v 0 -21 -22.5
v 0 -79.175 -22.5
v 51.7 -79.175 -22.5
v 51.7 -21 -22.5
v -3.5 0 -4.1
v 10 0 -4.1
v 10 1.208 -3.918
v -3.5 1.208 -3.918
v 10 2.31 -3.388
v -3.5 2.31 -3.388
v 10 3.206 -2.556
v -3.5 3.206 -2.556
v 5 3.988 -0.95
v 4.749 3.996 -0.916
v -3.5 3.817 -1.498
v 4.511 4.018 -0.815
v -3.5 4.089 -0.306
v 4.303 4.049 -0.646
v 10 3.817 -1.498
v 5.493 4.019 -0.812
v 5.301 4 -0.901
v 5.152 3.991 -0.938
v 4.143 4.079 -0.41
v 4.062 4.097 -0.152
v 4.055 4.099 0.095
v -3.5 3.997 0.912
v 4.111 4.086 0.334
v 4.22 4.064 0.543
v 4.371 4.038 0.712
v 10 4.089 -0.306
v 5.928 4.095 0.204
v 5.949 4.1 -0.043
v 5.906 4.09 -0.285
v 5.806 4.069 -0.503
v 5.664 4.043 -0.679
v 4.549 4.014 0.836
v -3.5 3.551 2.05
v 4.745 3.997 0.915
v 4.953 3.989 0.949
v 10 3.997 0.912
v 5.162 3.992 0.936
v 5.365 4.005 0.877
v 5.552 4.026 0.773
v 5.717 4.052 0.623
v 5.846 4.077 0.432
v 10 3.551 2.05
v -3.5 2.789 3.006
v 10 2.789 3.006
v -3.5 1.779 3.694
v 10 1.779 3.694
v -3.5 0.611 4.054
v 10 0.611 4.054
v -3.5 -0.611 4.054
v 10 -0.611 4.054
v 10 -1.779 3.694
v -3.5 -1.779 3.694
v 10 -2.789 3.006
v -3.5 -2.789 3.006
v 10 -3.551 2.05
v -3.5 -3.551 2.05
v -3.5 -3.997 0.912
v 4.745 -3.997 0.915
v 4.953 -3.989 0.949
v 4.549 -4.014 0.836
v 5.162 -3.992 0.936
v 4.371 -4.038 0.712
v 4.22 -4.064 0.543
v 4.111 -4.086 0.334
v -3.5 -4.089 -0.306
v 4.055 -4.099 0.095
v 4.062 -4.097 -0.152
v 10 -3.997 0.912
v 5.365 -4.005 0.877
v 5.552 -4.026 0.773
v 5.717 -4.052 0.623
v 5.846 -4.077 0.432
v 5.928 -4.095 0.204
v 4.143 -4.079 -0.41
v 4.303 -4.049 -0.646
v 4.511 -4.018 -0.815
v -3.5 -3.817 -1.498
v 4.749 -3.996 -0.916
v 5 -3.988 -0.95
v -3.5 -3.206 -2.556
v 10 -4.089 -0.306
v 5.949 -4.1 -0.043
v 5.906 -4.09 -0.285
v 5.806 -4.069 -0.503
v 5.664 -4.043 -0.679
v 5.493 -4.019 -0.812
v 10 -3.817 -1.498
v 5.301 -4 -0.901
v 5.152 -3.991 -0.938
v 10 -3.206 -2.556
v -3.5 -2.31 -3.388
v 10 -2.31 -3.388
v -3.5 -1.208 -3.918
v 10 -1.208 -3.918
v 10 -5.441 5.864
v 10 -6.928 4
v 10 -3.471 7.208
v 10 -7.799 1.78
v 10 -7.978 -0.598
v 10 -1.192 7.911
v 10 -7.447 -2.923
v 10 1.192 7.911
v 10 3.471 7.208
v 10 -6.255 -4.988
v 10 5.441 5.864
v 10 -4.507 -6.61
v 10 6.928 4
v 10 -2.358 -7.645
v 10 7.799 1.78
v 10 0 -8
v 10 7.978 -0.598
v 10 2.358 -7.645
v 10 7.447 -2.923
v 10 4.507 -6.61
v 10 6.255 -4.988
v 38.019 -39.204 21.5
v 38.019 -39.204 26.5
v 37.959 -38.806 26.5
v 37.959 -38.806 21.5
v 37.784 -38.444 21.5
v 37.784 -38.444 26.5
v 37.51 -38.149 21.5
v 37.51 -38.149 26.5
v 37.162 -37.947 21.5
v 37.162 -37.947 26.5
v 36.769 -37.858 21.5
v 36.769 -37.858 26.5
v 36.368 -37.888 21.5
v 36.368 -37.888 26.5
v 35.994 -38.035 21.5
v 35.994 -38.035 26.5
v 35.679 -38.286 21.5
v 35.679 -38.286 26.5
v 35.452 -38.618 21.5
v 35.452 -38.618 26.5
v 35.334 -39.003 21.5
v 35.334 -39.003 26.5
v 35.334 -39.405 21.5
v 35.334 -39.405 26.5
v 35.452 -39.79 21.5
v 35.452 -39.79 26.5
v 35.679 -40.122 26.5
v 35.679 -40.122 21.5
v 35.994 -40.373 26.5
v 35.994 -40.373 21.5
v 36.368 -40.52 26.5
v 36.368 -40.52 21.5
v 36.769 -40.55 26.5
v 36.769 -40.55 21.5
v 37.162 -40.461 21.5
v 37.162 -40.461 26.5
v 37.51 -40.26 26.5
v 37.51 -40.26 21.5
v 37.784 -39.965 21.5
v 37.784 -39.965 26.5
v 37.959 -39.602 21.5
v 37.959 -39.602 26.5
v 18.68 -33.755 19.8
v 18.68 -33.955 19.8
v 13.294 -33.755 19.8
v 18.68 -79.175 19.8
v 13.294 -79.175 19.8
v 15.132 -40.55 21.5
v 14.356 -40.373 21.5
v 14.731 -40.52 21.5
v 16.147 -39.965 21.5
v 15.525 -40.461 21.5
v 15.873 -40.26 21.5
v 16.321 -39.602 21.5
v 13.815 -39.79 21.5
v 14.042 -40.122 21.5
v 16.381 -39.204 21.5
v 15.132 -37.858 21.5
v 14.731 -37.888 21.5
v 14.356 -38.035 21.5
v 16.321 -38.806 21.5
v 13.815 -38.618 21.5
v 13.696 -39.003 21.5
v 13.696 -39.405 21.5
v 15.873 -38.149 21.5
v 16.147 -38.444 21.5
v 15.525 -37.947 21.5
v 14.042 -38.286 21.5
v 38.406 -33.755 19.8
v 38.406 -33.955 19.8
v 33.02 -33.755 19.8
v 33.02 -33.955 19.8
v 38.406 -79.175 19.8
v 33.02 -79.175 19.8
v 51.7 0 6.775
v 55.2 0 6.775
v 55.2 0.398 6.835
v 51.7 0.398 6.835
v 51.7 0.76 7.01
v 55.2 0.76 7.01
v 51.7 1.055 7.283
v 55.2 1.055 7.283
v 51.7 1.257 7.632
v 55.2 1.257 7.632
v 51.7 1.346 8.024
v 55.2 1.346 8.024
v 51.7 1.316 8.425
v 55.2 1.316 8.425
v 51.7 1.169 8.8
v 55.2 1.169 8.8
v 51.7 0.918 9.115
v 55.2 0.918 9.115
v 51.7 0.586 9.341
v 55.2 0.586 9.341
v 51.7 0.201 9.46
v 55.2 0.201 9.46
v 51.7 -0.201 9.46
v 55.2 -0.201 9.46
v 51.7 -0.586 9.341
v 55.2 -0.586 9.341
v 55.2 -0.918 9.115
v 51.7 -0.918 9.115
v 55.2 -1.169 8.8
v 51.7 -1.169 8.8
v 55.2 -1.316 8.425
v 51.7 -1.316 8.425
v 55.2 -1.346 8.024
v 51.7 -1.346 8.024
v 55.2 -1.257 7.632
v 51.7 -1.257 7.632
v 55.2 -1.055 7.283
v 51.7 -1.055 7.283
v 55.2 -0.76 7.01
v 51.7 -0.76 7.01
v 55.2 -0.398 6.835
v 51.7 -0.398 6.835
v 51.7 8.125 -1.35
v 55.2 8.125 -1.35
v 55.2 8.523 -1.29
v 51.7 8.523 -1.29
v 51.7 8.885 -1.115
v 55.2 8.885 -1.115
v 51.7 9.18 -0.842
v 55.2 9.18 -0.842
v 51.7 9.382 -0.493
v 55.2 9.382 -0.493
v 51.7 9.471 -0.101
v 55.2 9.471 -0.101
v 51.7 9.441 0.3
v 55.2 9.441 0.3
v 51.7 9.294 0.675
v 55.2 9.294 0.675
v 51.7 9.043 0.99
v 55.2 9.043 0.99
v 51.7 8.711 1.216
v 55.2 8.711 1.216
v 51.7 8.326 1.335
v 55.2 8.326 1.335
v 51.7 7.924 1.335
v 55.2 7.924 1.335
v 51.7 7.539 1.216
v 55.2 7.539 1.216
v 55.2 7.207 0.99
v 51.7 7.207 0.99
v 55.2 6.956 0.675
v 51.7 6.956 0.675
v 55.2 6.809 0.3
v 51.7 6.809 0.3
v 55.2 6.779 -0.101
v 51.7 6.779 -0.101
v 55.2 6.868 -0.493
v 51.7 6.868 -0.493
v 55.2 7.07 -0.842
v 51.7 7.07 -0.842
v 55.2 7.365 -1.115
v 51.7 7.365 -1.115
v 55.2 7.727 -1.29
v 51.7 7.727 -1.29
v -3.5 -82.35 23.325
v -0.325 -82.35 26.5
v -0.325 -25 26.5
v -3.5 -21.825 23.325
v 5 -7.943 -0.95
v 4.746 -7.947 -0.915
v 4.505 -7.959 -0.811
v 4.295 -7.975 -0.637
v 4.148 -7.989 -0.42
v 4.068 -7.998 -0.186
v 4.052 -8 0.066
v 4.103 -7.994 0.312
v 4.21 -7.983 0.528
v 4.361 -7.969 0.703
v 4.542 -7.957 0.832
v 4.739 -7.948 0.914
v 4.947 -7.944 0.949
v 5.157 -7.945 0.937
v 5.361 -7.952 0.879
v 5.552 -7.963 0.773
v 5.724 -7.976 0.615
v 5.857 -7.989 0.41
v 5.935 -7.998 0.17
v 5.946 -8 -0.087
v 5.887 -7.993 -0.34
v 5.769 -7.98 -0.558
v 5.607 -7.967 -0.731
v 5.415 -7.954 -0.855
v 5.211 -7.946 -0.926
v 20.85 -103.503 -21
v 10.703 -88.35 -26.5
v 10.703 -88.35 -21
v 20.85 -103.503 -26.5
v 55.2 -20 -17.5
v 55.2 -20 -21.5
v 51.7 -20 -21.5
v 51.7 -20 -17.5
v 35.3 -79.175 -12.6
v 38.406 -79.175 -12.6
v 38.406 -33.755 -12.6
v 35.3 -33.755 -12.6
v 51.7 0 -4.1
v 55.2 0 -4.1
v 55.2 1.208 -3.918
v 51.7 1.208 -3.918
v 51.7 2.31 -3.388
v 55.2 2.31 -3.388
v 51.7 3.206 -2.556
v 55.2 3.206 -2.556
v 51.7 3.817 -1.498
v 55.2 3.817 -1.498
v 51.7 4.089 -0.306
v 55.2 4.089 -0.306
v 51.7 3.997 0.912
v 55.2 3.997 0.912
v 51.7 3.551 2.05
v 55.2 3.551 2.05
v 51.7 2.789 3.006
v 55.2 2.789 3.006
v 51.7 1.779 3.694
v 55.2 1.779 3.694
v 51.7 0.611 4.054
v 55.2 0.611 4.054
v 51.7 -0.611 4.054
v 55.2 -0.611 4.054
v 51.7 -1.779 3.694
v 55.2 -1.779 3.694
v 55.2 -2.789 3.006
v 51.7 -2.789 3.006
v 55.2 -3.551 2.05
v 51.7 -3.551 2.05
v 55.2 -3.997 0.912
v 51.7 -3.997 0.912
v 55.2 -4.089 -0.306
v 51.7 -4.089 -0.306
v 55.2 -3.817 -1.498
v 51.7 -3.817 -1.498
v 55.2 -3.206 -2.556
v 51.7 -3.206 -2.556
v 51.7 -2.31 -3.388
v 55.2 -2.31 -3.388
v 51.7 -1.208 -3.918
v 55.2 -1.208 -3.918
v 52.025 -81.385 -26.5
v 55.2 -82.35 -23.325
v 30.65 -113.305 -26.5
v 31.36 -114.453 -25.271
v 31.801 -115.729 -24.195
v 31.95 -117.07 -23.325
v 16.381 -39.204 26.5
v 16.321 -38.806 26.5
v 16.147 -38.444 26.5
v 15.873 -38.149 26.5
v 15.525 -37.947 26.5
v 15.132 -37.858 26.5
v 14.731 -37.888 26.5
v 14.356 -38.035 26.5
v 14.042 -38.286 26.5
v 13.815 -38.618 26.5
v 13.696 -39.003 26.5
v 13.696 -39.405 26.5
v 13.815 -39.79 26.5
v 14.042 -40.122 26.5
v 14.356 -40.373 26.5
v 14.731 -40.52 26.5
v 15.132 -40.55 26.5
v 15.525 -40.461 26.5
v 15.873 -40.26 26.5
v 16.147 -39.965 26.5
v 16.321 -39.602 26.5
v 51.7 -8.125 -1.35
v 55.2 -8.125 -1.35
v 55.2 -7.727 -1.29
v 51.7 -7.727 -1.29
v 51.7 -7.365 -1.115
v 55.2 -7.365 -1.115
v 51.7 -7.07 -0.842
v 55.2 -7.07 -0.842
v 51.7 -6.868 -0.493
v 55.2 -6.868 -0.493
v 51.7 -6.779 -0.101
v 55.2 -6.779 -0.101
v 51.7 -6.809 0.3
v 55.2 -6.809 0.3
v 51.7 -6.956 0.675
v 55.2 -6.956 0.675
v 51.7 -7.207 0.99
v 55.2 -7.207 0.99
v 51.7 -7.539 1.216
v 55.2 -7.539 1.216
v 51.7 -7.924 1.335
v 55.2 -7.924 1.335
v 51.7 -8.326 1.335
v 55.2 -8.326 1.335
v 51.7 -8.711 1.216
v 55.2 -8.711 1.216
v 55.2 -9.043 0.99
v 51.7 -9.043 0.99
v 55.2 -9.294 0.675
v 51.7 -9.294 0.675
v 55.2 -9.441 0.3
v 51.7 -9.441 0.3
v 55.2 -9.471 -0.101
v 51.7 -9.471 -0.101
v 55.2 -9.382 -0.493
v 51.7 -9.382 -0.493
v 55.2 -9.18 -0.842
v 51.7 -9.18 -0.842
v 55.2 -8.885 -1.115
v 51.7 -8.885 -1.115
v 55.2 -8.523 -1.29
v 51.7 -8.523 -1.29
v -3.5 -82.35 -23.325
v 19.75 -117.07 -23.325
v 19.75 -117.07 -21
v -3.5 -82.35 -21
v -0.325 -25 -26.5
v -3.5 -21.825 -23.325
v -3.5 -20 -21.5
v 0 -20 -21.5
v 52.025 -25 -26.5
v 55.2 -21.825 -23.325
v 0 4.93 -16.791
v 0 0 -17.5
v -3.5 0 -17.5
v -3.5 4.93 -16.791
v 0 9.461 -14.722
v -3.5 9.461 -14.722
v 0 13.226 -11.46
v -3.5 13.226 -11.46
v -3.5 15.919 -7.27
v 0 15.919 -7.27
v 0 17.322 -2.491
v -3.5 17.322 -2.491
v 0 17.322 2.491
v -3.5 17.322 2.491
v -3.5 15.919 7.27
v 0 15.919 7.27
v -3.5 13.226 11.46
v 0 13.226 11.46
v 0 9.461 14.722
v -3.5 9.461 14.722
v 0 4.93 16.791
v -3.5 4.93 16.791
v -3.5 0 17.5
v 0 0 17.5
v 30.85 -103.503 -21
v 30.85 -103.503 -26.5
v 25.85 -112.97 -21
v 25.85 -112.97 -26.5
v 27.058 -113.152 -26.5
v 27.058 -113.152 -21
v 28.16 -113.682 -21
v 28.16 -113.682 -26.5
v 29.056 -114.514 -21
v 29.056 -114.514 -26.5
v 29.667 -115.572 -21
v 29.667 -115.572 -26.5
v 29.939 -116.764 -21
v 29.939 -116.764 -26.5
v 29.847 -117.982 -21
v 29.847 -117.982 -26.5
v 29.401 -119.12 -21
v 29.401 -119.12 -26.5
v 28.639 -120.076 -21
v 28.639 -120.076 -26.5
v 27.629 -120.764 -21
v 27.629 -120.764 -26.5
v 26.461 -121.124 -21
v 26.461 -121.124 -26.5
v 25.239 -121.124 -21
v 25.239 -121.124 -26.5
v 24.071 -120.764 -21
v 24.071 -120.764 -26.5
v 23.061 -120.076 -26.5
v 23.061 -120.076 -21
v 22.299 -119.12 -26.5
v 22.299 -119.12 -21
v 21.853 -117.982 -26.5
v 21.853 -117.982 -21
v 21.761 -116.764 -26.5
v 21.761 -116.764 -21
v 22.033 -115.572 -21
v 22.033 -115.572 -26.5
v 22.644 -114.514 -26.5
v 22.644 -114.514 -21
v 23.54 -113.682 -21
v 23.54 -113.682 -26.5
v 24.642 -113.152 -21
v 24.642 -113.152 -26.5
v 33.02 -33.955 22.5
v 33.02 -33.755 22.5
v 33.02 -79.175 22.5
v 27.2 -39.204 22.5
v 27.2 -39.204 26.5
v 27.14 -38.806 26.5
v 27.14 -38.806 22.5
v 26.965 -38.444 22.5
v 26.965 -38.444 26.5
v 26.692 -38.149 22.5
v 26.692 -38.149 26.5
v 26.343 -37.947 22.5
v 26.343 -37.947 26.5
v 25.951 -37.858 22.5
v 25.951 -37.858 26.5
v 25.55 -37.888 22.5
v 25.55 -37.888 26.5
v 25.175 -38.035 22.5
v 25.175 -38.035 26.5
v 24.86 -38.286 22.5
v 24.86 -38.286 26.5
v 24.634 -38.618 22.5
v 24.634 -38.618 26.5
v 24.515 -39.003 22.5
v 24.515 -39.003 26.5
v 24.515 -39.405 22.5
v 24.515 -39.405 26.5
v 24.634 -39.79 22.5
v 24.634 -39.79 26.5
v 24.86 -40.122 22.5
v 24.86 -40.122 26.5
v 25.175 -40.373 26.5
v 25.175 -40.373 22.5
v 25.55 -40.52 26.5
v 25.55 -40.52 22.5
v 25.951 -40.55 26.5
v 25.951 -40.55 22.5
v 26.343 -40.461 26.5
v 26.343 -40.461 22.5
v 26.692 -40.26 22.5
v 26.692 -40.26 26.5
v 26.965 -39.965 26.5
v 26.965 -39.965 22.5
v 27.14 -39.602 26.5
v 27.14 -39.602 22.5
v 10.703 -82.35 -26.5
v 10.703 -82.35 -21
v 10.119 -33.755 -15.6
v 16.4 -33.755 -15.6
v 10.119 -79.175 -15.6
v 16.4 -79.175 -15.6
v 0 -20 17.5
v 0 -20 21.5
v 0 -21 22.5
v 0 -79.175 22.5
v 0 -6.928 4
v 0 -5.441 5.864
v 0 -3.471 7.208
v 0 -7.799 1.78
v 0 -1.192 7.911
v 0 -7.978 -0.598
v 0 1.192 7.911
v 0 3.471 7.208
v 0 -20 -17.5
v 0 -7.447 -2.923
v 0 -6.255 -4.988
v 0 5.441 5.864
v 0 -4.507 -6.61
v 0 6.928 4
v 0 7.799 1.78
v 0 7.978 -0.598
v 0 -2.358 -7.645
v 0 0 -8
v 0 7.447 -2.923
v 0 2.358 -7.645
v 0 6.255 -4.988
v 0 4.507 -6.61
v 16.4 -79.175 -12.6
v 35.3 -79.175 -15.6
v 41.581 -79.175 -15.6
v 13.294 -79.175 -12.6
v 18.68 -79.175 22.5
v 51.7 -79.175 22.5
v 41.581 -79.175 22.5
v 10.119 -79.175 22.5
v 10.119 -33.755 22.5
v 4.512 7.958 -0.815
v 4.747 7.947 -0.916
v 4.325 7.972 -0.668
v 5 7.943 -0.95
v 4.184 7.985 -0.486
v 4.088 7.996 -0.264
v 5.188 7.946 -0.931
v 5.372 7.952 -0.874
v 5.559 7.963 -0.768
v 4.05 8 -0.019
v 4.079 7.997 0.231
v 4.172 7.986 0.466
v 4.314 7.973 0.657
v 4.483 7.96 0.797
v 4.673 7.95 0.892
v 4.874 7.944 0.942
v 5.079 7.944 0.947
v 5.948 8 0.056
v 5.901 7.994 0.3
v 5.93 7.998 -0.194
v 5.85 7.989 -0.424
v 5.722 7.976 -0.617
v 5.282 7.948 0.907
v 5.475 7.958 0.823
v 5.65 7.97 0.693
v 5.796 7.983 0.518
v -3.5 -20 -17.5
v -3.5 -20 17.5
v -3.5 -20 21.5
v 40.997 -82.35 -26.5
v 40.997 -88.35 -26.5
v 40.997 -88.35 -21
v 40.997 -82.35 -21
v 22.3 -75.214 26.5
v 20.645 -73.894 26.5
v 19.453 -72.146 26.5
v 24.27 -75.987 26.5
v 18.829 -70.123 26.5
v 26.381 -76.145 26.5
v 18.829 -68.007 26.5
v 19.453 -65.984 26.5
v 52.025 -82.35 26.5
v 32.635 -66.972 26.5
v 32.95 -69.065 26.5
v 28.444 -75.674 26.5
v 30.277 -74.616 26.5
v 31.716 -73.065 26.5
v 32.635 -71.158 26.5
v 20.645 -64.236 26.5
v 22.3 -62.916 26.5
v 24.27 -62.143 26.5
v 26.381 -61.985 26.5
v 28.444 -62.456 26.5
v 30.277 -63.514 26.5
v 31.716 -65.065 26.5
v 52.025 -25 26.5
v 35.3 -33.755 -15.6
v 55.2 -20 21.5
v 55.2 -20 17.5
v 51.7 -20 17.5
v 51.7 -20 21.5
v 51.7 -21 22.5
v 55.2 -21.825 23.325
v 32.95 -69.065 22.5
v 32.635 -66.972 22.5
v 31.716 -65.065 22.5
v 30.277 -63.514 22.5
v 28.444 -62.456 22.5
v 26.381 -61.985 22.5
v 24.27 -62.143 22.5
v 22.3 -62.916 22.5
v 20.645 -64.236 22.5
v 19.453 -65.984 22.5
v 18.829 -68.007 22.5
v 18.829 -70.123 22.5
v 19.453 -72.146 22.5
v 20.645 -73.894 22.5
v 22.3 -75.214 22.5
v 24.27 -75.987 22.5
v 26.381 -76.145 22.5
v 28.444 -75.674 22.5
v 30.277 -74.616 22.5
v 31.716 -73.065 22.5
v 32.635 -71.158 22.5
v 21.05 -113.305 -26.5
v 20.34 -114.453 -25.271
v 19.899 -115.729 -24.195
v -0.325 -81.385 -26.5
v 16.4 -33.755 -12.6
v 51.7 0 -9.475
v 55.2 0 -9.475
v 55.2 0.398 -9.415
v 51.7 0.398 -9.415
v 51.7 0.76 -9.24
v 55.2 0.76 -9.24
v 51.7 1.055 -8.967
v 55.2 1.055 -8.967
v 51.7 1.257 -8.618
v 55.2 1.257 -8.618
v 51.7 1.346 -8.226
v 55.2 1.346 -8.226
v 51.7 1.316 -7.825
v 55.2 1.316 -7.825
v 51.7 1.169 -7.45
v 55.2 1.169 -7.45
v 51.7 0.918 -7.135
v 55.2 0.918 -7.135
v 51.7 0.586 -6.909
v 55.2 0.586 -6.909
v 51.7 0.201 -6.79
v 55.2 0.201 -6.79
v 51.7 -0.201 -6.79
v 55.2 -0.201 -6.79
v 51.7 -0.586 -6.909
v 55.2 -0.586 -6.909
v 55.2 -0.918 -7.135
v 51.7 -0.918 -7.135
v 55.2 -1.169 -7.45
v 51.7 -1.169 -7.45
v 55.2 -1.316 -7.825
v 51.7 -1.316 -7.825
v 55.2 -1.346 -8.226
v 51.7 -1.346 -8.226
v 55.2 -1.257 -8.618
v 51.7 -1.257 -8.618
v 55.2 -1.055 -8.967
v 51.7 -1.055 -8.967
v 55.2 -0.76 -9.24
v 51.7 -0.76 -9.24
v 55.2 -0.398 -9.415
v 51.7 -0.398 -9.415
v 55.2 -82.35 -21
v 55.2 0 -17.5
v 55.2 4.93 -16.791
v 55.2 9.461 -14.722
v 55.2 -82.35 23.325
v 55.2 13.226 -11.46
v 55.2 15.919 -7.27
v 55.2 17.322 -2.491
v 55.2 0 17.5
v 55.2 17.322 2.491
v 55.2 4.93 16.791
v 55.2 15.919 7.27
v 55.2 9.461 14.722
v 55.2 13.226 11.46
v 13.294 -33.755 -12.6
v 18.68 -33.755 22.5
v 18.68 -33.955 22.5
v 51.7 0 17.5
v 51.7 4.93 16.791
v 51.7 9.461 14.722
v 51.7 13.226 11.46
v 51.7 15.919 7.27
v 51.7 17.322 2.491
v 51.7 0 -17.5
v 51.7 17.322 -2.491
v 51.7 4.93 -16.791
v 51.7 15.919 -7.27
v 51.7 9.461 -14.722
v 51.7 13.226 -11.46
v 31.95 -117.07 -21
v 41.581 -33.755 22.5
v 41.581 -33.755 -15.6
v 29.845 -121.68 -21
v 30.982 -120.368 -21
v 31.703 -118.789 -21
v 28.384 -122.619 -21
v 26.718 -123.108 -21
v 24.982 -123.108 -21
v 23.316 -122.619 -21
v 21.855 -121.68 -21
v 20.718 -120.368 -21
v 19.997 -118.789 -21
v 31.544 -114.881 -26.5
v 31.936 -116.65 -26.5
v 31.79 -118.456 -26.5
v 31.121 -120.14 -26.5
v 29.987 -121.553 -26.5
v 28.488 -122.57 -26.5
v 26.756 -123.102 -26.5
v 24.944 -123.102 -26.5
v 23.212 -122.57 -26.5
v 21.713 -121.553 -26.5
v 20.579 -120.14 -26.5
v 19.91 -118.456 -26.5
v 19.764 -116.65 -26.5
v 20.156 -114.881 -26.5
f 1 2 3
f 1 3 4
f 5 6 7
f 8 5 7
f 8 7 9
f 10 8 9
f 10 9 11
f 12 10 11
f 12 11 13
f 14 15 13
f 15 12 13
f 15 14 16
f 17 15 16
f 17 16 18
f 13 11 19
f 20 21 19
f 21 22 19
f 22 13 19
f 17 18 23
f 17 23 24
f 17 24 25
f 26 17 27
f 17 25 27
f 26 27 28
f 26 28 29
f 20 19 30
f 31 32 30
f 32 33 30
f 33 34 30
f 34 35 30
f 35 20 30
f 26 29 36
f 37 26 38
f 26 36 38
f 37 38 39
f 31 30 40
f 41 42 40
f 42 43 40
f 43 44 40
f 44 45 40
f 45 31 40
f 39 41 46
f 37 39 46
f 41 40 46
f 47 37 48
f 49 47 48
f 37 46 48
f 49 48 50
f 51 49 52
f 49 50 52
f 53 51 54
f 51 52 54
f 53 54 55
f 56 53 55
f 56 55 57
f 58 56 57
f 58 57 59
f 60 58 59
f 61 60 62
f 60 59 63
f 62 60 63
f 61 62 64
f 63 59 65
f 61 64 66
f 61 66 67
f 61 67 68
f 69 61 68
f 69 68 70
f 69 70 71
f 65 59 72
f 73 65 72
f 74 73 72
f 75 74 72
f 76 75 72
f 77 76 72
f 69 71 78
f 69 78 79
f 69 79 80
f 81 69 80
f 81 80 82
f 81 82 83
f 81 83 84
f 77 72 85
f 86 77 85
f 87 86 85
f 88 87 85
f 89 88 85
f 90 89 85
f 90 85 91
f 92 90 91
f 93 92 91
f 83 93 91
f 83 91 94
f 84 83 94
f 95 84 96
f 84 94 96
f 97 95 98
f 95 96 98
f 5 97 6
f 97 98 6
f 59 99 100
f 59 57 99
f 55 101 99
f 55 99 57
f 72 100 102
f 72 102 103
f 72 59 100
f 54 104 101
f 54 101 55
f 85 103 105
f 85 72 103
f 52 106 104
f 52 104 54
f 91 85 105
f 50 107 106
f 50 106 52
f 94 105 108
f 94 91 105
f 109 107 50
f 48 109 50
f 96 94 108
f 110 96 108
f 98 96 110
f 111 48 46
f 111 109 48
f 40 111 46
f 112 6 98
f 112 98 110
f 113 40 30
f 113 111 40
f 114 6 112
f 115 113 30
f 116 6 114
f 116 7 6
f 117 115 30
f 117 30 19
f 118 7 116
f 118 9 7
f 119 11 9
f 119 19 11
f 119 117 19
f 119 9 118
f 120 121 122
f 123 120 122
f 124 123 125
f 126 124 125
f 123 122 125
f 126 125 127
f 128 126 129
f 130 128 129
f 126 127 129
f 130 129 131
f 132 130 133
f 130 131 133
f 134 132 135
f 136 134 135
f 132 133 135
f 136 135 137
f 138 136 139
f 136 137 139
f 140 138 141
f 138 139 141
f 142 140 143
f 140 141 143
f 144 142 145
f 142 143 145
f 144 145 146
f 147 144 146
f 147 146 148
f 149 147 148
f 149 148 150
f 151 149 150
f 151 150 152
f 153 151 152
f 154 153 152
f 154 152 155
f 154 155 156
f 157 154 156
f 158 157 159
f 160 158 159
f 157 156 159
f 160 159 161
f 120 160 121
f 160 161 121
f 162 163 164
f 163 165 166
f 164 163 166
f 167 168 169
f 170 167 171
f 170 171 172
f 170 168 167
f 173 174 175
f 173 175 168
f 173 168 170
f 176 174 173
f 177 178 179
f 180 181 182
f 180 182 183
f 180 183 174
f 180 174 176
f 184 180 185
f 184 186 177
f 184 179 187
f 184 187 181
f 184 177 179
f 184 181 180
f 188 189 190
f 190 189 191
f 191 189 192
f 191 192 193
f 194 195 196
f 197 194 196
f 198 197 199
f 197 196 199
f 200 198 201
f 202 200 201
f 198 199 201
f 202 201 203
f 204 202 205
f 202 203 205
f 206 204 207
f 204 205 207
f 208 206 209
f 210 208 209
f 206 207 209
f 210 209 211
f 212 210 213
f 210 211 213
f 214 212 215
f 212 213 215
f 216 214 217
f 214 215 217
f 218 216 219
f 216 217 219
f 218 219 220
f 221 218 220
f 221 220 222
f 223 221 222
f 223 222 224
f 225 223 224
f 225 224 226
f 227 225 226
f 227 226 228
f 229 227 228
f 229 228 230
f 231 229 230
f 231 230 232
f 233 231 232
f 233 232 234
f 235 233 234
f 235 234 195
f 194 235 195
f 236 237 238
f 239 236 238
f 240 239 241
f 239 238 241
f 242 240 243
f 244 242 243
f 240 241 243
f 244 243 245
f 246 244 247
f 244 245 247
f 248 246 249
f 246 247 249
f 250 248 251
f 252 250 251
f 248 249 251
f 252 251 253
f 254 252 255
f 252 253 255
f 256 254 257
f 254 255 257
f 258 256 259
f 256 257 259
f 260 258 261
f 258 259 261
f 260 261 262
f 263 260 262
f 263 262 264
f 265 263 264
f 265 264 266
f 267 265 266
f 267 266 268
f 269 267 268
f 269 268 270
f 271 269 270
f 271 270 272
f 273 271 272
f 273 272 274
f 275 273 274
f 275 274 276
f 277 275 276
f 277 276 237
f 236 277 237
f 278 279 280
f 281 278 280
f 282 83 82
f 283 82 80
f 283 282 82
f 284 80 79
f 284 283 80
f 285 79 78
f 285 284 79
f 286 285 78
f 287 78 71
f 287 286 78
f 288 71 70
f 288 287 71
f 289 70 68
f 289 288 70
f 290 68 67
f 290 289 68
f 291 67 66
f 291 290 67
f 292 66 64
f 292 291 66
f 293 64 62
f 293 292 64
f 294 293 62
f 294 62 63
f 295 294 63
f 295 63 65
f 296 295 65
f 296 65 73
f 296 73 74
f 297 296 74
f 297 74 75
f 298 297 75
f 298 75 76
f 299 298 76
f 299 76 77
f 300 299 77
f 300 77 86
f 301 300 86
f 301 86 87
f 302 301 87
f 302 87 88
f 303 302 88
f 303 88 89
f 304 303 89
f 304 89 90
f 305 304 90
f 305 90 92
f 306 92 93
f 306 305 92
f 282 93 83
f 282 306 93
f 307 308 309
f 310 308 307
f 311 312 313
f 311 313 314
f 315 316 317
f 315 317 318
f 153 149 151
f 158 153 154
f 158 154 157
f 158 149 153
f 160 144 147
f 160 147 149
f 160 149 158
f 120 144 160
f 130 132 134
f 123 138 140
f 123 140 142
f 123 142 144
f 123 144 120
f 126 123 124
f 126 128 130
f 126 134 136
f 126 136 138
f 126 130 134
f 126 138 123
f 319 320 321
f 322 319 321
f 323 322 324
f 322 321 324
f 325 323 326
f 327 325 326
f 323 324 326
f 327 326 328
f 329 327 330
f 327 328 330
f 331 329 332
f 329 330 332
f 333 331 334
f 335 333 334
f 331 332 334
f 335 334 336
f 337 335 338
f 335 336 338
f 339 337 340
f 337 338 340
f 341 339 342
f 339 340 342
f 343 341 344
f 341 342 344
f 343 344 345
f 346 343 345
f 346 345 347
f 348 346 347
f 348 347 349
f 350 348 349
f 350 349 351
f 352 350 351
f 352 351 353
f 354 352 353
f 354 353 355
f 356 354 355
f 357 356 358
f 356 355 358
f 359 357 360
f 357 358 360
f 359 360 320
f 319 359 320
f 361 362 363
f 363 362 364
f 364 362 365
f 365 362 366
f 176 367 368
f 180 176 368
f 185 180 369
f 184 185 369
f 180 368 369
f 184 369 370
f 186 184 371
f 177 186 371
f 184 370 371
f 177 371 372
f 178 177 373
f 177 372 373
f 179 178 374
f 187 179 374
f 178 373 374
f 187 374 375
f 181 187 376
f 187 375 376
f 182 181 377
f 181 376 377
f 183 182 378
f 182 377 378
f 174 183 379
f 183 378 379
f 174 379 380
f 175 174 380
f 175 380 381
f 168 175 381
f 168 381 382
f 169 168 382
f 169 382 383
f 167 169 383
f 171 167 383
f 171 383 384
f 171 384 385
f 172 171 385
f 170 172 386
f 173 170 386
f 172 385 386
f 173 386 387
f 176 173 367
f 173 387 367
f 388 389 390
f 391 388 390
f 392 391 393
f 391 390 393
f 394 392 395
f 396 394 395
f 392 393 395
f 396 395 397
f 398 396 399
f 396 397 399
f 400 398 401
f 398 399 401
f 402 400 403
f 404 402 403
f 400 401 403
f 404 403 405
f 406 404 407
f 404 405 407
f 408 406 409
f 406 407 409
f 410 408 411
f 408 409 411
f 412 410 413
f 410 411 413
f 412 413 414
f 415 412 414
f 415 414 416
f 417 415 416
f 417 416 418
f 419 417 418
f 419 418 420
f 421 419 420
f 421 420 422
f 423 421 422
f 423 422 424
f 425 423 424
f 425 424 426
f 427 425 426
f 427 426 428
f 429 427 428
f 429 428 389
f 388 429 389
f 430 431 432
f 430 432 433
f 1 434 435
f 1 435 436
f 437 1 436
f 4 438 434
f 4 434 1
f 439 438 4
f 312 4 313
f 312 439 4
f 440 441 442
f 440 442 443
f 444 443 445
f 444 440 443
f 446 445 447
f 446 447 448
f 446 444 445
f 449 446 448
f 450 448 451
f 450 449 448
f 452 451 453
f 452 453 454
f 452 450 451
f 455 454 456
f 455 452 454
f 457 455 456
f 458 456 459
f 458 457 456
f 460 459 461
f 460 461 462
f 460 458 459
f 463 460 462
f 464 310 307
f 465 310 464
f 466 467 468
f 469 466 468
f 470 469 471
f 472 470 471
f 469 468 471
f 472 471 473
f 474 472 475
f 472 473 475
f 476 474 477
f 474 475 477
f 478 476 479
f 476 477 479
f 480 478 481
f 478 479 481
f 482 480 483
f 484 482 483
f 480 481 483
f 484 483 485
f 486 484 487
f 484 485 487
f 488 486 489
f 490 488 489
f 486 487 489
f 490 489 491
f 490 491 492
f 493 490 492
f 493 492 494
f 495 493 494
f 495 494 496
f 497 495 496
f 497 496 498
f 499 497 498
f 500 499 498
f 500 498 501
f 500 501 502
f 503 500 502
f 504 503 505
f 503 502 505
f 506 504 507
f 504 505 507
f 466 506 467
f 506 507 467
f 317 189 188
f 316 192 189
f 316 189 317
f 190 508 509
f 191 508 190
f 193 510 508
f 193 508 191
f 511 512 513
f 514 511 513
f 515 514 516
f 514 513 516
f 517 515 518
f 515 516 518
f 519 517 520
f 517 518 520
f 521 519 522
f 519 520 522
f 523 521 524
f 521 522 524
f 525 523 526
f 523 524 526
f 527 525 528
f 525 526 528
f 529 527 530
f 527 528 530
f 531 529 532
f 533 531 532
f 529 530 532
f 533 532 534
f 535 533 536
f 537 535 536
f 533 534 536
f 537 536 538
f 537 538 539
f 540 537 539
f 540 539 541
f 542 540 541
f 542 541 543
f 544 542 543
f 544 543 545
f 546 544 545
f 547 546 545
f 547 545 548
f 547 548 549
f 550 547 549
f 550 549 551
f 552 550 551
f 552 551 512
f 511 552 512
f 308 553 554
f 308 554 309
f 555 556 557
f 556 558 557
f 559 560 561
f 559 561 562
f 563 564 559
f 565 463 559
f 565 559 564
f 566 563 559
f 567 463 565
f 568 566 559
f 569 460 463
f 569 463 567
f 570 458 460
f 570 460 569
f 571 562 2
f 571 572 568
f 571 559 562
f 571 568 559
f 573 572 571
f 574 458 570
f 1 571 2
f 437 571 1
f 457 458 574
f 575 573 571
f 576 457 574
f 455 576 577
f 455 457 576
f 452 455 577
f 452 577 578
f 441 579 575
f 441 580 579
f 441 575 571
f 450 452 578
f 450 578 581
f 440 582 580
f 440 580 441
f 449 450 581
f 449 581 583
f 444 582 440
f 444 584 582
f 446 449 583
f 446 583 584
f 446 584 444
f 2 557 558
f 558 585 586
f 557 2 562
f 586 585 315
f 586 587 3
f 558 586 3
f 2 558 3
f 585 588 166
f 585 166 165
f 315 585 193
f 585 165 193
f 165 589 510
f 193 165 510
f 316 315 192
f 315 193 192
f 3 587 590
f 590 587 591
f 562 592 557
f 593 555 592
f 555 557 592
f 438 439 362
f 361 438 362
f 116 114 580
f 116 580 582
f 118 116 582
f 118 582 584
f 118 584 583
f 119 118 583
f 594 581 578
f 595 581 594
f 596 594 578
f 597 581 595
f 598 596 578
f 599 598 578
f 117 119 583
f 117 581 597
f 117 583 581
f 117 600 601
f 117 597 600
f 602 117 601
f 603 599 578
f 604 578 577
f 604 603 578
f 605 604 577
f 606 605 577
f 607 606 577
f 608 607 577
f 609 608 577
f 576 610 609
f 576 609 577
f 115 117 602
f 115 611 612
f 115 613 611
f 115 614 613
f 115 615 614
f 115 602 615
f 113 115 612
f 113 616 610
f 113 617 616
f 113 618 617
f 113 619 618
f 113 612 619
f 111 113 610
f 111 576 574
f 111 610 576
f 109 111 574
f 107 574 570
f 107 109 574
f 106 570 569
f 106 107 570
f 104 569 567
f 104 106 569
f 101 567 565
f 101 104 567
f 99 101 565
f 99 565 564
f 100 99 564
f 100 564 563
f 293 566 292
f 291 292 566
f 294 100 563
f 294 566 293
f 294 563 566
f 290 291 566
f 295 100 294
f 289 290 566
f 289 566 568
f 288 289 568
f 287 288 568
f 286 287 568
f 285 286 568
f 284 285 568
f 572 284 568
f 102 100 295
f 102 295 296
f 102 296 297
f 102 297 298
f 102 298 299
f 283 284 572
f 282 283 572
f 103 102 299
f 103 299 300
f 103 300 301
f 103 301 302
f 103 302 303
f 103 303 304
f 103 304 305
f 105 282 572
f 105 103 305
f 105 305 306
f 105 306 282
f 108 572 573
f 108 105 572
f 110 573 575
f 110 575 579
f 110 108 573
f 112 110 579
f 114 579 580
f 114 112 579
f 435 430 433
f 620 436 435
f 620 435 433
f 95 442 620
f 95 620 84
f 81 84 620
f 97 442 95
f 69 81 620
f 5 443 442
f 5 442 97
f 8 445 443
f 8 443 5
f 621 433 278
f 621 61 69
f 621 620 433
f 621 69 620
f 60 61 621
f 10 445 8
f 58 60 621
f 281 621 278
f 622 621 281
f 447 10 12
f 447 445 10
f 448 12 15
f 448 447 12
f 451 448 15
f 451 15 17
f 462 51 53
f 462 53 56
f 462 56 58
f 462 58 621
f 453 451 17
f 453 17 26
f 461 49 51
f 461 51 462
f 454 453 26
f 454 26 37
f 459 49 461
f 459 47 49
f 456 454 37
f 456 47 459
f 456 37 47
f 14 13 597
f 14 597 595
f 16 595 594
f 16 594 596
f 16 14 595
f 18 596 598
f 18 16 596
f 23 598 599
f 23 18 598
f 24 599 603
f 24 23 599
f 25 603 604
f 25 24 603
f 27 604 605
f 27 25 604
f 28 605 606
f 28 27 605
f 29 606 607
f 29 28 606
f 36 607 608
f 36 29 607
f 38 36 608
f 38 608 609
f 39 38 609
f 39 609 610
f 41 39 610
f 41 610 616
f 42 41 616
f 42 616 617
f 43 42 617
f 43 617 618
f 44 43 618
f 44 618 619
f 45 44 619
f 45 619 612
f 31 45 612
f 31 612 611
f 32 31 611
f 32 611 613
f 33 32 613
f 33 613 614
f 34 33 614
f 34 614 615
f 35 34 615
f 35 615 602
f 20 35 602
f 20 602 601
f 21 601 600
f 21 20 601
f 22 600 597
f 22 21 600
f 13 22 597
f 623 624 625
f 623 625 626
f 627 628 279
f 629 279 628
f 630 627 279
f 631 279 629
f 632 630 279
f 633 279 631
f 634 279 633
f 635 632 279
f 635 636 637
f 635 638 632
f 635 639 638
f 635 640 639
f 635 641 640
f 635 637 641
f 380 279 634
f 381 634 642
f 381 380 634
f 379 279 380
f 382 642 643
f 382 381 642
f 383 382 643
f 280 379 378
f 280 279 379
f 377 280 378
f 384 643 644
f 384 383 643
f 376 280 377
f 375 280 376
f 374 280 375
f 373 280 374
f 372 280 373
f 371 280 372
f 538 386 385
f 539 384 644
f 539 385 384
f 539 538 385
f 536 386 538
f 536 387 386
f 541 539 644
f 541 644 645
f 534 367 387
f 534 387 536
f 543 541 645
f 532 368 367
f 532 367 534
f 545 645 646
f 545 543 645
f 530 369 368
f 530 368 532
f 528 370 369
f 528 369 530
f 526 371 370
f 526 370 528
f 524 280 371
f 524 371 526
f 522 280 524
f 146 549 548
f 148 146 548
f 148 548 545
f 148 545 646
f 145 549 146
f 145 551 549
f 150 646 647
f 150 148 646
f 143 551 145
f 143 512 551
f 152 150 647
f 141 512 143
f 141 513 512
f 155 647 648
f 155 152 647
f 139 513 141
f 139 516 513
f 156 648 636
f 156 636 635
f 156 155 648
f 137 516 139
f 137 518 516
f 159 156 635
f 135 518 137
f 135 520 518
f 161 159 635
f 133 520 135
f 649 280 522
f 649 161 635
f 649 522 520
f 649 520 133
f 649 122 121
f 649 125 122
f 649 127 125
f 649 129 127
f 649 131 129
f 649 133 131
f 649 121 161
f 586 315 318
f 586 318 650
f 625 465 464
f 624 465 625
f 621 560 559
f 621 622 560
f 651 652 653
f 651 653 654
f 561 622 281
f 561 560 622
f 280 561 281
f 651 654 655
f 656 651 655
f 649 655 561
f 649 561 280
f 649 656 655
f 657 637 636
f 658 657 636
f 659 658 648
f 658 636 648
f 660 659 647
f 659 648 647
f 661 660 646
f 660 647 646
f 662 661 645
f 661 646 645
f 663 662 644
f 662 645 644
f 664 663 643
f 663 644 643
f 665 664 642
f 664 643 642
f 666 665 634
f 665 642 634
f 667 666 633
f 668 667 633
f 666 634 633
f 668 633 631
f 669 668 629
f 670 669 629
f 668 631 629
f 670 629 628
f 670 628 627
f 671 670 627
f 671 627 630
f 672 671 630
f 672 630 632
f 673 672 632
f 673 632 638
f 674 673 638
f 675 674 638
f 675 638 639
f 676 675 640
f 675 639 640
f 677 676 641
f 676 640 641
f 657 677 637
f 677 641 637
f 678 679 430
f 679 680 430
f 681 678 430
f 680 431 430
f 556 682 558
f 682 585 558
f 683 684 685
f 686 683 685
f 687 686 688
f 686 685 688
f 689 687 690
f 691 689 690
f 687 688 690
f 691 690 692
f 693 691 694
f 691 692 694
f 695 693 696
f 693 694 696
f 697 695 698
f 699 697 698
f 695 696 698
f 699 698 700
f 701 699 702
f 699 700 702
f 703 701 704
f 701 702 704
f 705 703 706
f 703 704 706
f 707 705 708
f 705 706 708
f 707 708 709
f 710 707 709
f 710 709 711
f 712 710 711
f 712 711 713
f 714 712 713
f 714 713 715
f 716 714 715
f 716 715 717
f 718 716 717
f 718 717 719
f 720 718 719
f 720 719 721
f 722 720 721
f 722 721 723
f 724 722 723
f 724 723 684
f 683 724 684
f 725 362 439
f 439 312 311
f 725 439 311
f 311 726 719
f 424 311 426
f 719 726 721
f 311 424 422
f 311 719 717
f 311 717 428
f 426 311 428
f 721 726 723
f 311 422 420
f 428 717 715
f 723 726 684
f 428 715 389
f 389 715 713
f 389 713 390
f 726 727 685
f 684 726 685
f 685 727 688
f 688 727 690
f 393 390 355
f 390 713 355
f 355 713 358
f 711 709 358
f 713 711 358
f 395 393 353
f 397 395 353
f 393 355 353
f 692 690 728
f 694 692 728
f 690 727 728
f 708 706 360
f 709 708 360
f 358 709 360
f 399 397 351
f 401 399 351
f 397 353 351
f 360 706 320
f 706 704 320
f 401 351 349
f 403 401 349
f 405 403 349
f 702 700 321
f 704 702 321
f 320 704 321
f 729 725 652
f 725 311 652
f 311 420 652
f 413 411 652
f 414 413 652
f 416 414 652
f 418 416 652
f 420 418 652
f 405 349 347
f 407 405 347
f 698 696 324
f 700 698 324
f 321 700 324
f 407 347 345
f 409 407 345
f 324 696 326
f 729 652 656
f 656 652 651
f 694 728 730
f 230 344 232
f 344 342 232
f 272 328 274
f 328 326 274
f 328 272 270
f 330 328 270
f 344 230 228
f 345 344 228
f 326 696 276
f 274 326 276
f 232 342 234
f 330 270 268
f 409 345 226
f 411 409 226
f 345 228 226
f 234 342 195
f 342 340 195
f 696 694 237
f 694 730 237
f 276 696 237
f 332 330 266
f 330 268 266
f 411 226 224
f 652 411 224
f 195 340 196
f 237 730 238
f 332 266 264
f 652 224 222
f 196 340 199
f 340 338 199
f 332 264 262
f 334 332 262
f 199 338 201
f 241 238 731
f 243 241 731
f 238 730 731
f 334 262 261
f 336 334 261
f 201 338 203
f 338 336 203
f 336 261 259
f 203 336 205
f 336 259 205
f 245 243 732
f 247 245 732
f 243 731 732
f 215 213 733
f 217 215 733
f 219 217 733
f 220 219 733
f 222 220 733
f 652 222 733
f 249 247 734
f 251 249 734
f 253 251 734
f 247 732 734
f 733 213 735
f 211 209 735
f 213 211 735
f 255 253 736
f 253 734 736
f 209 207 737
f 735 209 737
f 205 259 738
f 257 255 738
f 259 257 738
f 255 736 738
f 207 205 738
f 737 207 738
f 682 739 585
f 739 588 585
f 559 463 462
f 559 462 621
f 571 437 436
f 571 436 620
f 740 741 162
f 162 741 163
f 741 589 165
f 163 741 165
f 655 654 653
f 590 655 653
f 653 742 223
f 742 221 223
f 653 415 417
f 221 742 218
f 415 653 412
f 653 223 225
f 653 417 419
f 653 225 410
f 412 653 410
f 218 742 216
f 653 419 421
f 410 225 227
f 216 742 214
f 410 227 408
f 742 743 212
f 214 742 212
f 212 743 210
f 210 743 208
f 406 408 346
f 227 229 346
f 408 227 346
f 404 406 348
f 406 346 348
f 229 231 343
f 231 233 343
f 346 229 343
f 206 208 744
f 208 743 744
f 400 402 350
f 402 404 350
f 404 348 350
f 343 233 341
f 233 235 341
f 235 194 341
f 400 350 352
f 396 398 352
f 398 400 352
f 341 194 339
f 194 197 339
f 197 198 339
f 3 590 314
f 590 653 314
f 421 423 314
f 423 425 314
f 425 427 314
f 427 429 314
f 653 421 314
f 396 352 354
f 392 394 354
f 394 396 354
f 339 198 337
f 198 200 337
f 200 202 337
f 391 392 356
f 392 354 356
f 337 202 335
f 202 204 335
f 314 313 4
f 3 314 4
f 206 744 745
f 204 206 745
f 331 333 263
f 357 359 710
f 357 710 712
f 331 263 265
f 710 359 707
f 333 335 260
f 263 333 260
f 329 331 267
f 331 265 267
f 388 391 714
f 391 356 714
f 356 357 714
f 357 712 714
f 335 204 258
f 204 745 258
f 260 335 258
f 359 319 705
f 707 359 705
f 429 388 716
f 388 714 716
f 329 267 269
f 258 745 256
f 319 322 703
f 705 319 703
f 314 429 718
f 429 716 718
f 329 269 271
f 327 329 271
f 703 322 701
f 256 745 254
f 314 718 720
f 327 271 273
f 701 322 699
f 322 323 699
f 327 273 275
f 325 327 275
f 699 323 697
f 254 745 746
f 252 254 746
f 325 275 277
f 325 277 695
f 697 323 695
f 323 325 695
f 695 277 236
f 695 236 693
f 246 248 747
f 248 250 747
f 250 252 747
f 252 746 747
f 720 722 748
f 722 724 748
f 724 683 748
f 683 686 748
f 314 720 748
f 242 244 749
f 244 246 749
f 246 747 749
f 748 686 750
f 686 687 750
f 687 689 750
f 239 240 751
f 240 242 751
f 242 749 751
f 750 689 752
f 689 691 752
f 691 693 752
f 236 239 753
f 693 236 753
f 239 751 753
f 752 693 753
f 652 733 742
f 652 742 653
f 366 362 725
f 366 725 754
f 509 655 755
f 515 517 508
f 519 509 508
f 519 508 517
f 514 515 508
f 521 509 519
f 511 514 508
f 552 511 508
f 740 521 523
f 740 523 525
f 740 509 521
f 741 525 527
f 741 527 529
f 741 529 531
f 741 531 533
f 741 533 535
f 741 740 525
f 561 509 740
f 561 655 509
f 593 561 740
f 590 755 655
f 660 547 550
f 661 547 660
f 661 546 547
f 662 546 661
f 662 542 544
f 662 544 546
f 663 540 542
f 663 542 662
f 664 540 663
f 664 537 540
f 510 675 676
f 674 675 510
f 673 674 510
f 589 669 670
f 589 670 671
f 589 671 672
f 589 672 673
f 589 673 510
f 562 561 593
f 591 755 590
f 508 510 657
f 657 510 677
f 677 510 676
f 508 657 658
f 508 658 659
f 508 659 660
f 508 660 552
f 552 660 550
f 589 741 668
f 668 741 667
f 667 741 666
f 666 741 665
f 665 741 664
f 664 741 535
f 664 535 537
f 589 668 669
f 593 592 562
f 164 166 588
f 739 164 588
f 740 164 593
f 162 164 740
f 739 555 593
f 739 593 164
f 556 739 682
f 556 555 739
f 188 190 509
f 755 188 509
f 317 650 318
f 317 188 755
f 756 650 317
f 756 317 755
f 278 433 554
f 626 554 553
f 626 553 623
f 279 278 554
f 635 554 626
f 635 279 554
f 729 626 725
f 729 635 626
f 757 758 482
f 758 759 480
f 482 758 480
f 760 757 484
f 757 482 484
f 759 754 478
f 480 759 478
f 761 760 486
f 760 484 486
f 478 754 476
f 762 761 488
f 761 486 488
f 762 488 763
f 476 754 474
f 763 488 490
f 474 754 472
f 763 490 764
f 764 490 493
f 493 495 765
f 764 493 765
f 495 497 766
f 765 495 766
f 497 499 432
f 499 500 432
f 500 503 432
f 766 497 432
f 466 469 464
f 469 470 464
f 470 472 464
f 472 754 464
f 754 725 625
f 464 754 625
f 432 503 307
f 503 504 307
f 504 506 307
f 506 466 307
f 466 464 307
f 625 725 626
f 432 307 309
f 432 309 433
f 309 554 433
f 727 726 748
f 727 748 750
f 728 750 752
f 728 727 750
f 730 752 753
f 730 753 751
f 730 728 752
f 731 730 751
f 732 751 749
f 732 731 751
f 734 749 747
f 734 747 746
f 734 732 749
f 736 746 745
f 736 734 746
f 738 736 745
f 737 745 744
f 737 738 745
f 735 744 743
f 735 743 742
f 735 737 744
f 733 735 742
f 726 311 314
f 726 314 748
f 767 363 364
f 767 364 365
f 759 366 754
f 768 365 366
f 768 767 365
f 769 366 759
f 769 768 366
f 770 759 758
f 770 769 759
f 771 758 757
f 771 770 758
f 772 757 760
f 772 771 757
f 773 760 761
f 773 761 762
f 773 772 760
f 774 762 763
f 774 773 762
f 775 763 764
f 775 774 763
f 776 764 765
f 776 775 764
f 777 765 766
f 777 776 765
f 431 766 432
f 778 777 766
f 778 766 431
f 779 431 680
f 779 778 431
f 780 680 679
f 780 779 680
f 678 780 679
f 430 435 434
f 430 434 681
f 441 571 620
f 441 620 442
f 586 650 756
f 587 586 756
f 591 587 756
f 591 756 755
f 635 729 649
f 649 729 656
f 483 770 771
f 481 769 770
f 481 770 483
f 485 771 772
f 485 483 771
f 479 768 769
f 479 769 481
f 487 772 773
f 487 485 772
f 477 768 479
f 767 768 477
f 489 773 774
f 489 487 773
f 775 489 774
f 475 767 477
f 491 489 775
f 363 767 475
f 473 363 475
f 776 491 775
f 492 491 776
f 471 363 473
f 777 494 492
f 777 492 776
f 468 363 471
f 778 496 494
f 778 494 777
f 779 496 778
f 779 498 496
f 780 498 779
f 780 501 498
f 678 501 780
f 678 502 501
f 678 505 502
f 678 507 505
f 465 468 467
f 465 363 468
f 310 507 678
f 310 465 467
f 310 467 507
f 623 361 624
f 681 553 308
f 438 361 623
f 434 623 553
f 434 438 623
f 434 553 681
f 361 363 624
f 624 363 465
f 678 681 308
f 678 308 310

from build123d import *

# Parameters (mm, degrees)
SKETCH1_R                = 4.1
BOSS_EXTRUDE1_DEPTH      = 3.5
BOSS_EXTRUDE2_DEPTH      = 51.7
BOSS_EXTRUDE2_DEPTH_BACK = 3.5
CHAMFER2_SIZE            = 5
CUT_EXTRUDE1_REACH       = 112.079
SKETCH4_W                = 51.7
SKETCH4_H                = 45
BOSS_EXTRUDE3_START      = 3.5
SKETCH5_R                = 4.1
BOSS_EXTRUDE3_DEPTH      = 3.5
CUT_EXTRUDE3_REACH       = 104.062
SKETCH9_R                = 1.35
SKETCH10_W               = 58.7
SKETCH10_H               = 53
BOSS_EXTRUDE5_DEPTH      = 3.175
SKETCH26_R               = 7.1
CUT_EXTRUDE6_DEPTH       = 4
SKETCH27_W               = 3.175
SKETCH27_H               = 34.600130378
BOSS_EXTRUDE6_DEPTH      = 45.22
SKETCH29_R               = 4.1
BOSS_EXTRUDE8_DEPTH      = 5.5
CHAMFER3_SIZE            = 3.175
BOSS_EXTRUDE9_START      = 10
SKETCH30_R               = 8
SKETCH30_R_2             = 4.1
BOSS_EXTRUDE9_DEPTH      = 10
SKETCH31_R               = 0.95
CUT_EXTRUDE7_DEPTH       = 120.972242206
BOSS_EXTRUDE10_DEPTH     = 45.22
SKETCH33_W               = 5.386290257
SKETCH33_H               = 2.7
BOSS_EXTRUDE11_DEPTH     = 45.22
BOSS_EXTRUDE12_DEPTH     = 0.2
SKETCH35_R               = 1.35
CUT_EXTRUDE8_DEPTH       = 5


with BuildPart() as part:
    # Sketch1 → Boss-Extrude1 (new body)
    with BuildSketch(Plane(origin=(0, 0, 0), x_dir=(0, 0, -1), z_dir=(1, 0, 0))):
        with BuildLine():
            Line((-17.5, 0), (-17.5, -20))
            Line((-17.5, -20), (-22.5, -20))
            Line((-22.5, -20), (-22.5, -76))
            Line((-22.5, -76), (22.5, -76))
            Line((22.5, -76), (22.5, -20))
            Line((22.5, -20), (17.5, -20))
            Line((17.5, -20), (17.5, 0))
            ThreePointArc((17.5, 0), (0, 17.5), (-17.5, 0))
        make_face()
        Circle(SKETCH1_R, mode=Mode.SUBTRACT)
    extrude(amount=-BOSS_EXTRUDE1_DEPTH)

    # Sketch2 → Boss-Extrude2 (add, two sides: drawn at the far end of the back side and taken through both)
    with BuildSketch(Plane(origin=(0, 0, 0), x_dir=(0, 0, -1), z_dir=(1, 0, 0)).offset(-BOSS_EXTRUDE2_DEPTH_BACK)):
        Polygon((-22.5, -20), (-22.5, -76), (22.5, -76), (22.5, -20), (26.5, -20), (26.5, -79.175), (-26.5, -79.175), (-26.5, -20), align=None)
    extrude(amount=BOSS_EXTRUDE2_DEPTH + BOSS_EXTRUDE2_DEPTH_BACK)

    # Chamfer2
    chamfer2_edges = [part.edges().sort_by_distance(p)[0] for p in [
        (24.1, -20, -26.5),
        (24.1, -20, 26.5),
    ]]
    chamfer(chamfer2_edges, length=CHAMFER2_SIZE)

    # Sketch4 → Cut-Extrude1 (cut, up to next)
    with BuildSketch(Plane(origin=(0, -76, 0), x_dir=(1, 0, 0), z_dir=(0, 1, 0)), mode=Mode.PRIVATE) as cut_extrude1_sk1:
        with Locations((25.85, 0)):
            Rectangle(SKETCH4_W, SKETCH4_H)
    cut_extrude1_tool1 = extrude(cut_extrude1_sk1.sketch, amount=-CUT_EXTRUDE1_REACH, mode=Mode.PRIVATE) & part.part
    add(cut_extrude1_tool1.solids().sort_by_distance((25.85, -76, 0))[0], mode=Mode.SUBTRACT)

    # Sketch5 → Boss-Extrude3 (add)
    with BuildSketch(Plane(origin=(51.7, 0, 0), x_dir=(0, 0, -1), z_dir=(1, 0, 0)).offset(BOSS_EXTRUDE3_START)):
        with BuildLine():
            Line((21.5, -20), (17.5, -20))
            Line((17.5, -20), (17.5, 0))
            ThreePointArc((17.5, 0), (0, 17.5), (-17.5, 0))
            Line((-17.5, 0), (-17.5, -20))
            Line((-17.5, -20), (-21.5, -20))
            Line((-21.5, -20), (-26.5, -25))
            Line((-26.5, -25), (-26.5, -79.175))
            Line((-26.5, -79.175), (26.5, -79.175))
            Line((26.5, -79.175), (26.5, -25))
            Line((26.5, -25), (21.5, -20))
        make_face()
        Circle(SKETCH5_R, mode=Mode.SUBTRACT)
    extrude(amount=-BOSS_EXTRUDE3_DEPTH)

    # Sketch9 → Cut-Extrude3 (cut, up to next)
    with BuildSketch(Plane(origin=(55.2, 0, 0), x_dir=(0, 0, -1), z_dir=(1, 0, 0)), mode=Mode.PRIVATE) as cut_extrude3_sk1:
        with Locations((0, 8.125)):
            Circle(SKETCH9_R)
    cut_extrude3_tool1 = extrude(cut_extrude3_sk1.sketch, amount=-CUT_EXTRUDE3_REACH, mode=Mode.PRIVATE) & part.part
    # Sketch9 → Cut-Extrude3 (cut, up to next)
    with BuildSketch(Plane(origin=(55.2, 0, 0), x_dir=(0, 0, -1), z_dir=(1, 0, 0)), mode=Mode.PRIVATE) as cut_extrude3_sk2:
        with Locations((8.125, 0)):
            Circle(SKETCH9_R)
    cut_extrude3_tool2 = extrude(cut_extrude3_sk2.sketch, amount=-CUT_EXTRUDE3_REACH, mode=Mode.PRIVATE) & part.part
    # Sketch9 → Cut-Extrude3 (cut, up to next)
    with BuildSketch(Plane(origin=(55.2, 0, 0), x_dir=(0, 0, -1), z_dir=(1, 0, 0)), mode=Mode.PRIVATE) as cut_extrude3_sk3:
        with Locations((0, -8.125)):
            Circle(SKETCH9_R)
    cut_extrude3_tool3 = extrude(cut_extrude3_sk3.sketch, amount=-CUT_EXTRUDE3_REACH, mode=Mode.PRIVATE) & part.part
    # Sketch9 → Cut-Extrude3 (cut, up to next)
    with BuildSketch(Plane(origin=(55.2, 0, 0), x_dir=(0, 0, -1), z_dir=(1, 0, 0)), mode=Mode.PRIVATE) as cut_extrude3_sk4:
        with Locations((-8.125, 0)):
            Circle(SKETCH9_R)
    cut_extrude3_tool4 = extrude(cut_extrude3_sk4.sketch, amount=-CUT_EXTRUDE3_REACH, mode=Mode.PRIVATE) & part.part
    add(cut_extrude3_tool1.solids().sort_by_distance((55.2, 8.125, 0))[0], mode=Mode.SUBTRACT)
    add(cut_extrude3_tool2.solids().sort_by_distance((55.2, 0, -8.125))[0], mode=Mode.SUBTRACT)
    add(cut_extrude3_tool3.solids().sort_by_distance((55.2, -8.125, 0))[0], mode=Mode.SUBTRACT)
    add(cut_extrude3_tool4.solids().sort_by_distance((55.2, 0, 8.125))[0], mode=Mode.SUBTRACT)

    # Sketch10 → Boss-Extrude5 (add)
    with BuildSketch(Plane.XZ.offset(79.175)):
        with Locations((25.85, 0)):
            Rectangle(SKETCH10_W, SKETCH10_H)
    extrude(amount=BOSS_EXTRUDE5_DEPTH)

    # Sketch26 → Cut-Extrude6 (cut)
    with BuildSketch(Plane.XY.offset(26.5)):
        with Locations((25.85, -69.065)):
            Circle(SKETCH26_R)
    extrude(amount=-CUT_EXTRUDE6_DEPTH, mode=Mode.SUBTRACT)

    # Sketch27 → Boss-Extrude6 (add)
    with BuildSketch(Plane(origin=(0, -79.175, 0), x_dir=(1, 0, 0), z_dir=(0, 1, 0))):
        with Locations((39.993724488, -5.199934811)):
            Rectangle(SKETCH27_W, SKETCH27_H)
        with Locations((11.706275512, -5.199934811)):
            Rectangle(SKETCH27_W, SKETCH27_H)
    extrude(amount=BOSS_EXTRUDE6_DEPTH)

    # Sketch29 → Boss-Extrude8 (add)
    with BuildSketch(Plane(origin=(0, 0, -26.5), x_dir=(-1, 0, 0), z_dir=(0, 0, -1))):
        with BuildLine():
            Line((-40.997321429, -82.35), (-55.2, -82.35))
            Line((-55.2, -82.35), (-31.95, -117.07))
            ThreePointArc((-31.95, -117.07), (-25.85, -123.17), (-19.75, -117.07))
            Line((-19.75, -117.07), (3.5, -82.35))
            Line((3.5, -82.35), (-10.702678571, -82.35))
            Line((-10.702678571, -82.35), (-10.702678571, -88.35))
            Line((-10.702678571, -88.35), (-20.85, -103.503333333))
            Line((-20.85, -103.503333333), (-30.85, -103.503333333))
            Line((-30.85, -103.503333333), (-40.997321429, -88.35))
            Line((-40.997321429, -88.35), (-40.997321429, -82.35))
        make_face()
        with Locations(Location((-25.85, -117.07, 0), (0, 0, 90))):
            Circle(SKETCH29_R, mode=Mode.SUBTRACT)
    extrude(amount=-BOSS_EXTRUDE8_DEPTH)

    # Chamfer3
    chamfer3_edges = [part.edges().sort_by_distance(p)[0] for p in [
        (43.575, -99.71, -26.5),
        (8.125, -99.71, -26.5),
        (-3.5, -53.675, -26.5),
        (-3.5, -53.675, 26.5),
        (55.2, -53.675, 26.5),
        (55.2, -53.675, -26.5),
    ]]
    chamfer(chamfer3_edges, length=CHAMFER3_SIZE)

    # Sketch30 → Boss-Extrude9 (add)
    with BuildSketch(Plane(origin=(0, 0, 0), x_dir=(0, 0, -1), z_dir=(1, 0, 0)).offset(BOSS_EXTRUDE9_START)):
        Circle(SKETCH30_R)
        Circle(SKETCH30_R_2, mode=Mode.SUBTRACT)
    extrude(amount=-BOSS_EXTRUDE9_DEPTH)

    # Sketch31 → Cut-Extrude7 (cut, through all)
    with BuildSketch(Plane(origin=(0, -20, 0), x_dir=(1, 0, 0), z_dir=(0, 1, 0))):
        with Locations(Location((5, 0, 0), (0, 0, 90))):
            Circle(SKETCH31_R)
    extrude(amount=CUT_EXTRUDE7_DEPTH, mode=Mode.SUBTRACT)

    # Sketch32 → Boss-Extrude10 (add)
    with BuildSketch(Plane(origin=(0, -79.175, 0), x_dir=(1, 0, 0), z_dir=(0, 1, 0))):
        Polygon((13.293775512, 12.600036526), (16.4, 12.600036526), (16.4, 15.600130378), (10.118775512, 15.600130378), (10.118775512, 12.100130378), (13.293775512, 12.100130378), align=None)
    boss_extrude10 = extrude(amount=BOSS_EXTRUDE10_DEPTH)

    # Sketch33 → Boss-Extrude11 (add)
    with BuildSketch(Plane(origin=(0, -79.175, 0), x_dir=(1, 0, 0), z_dir=(0, 1, 0))):
        with Locations((15.986920641, -21.15)):
            Rectangle(SKETCH33_W, SKETCH33_H)
    boss_extrude11 = extrude(amount=BOSS_EXTRUDE11_DEPTH)

    # Mirror1: Boss-Extrude10, Boss-Extrude11 across plane
    add(boss_extrude10.mirror(Plane.ZY.offset(-25.85)))
    add(boss_extrude11.mirror(Plane.ZY.offset(-25.85)))

    # Sketch34 → Boss-Extrude12 (add)
    with BuildSketch(Plane(origin=(0, -33.955, 0), x_dir=(1, 0, 0), z_dir=(0, 1, 0))):
        Polygon((13.293775512, -19.8), (13.293775512, 12.600036526), (16.4, 12.600036526), (16.4, 15.600130378), (10.118775512, 15.600130378), (10.118775512, -22.5), (18.680065769, -22.5), (18.680065769, -19.8), align=None)
        Polygon((41.581224488, -22.5), (41.581224488, 15.600130378), (35.3, 15.600130378), (35.3, 12.600036526), (38.406224488, 12.600036526), (38.406224488, -19.8), (33.019934231, -19.8), (33.019934231, -22.5), align=None)
    extrude(amount=BOSS_EXTRUDE12_DEPTH)

    # Sketch35 → Cut-Extrude8 (cut)
    with BuildSketch(Plane.XY.offset(26.5)):
        with Locations((36.668603525, -39.204067417)):
            Circle(SKETCH35_R)
        with Locations((25.849997965, -39.204067417)):
            Circle(SKETCH35_R)
        with Locations((15.031392404, -39.204067417)):
            Circle(SKETCH35_R)
    extrude(amount=-CUT_EXTRUDE8_DEPTH, mode=Mode.SUBTRACT)


solid = part.part
